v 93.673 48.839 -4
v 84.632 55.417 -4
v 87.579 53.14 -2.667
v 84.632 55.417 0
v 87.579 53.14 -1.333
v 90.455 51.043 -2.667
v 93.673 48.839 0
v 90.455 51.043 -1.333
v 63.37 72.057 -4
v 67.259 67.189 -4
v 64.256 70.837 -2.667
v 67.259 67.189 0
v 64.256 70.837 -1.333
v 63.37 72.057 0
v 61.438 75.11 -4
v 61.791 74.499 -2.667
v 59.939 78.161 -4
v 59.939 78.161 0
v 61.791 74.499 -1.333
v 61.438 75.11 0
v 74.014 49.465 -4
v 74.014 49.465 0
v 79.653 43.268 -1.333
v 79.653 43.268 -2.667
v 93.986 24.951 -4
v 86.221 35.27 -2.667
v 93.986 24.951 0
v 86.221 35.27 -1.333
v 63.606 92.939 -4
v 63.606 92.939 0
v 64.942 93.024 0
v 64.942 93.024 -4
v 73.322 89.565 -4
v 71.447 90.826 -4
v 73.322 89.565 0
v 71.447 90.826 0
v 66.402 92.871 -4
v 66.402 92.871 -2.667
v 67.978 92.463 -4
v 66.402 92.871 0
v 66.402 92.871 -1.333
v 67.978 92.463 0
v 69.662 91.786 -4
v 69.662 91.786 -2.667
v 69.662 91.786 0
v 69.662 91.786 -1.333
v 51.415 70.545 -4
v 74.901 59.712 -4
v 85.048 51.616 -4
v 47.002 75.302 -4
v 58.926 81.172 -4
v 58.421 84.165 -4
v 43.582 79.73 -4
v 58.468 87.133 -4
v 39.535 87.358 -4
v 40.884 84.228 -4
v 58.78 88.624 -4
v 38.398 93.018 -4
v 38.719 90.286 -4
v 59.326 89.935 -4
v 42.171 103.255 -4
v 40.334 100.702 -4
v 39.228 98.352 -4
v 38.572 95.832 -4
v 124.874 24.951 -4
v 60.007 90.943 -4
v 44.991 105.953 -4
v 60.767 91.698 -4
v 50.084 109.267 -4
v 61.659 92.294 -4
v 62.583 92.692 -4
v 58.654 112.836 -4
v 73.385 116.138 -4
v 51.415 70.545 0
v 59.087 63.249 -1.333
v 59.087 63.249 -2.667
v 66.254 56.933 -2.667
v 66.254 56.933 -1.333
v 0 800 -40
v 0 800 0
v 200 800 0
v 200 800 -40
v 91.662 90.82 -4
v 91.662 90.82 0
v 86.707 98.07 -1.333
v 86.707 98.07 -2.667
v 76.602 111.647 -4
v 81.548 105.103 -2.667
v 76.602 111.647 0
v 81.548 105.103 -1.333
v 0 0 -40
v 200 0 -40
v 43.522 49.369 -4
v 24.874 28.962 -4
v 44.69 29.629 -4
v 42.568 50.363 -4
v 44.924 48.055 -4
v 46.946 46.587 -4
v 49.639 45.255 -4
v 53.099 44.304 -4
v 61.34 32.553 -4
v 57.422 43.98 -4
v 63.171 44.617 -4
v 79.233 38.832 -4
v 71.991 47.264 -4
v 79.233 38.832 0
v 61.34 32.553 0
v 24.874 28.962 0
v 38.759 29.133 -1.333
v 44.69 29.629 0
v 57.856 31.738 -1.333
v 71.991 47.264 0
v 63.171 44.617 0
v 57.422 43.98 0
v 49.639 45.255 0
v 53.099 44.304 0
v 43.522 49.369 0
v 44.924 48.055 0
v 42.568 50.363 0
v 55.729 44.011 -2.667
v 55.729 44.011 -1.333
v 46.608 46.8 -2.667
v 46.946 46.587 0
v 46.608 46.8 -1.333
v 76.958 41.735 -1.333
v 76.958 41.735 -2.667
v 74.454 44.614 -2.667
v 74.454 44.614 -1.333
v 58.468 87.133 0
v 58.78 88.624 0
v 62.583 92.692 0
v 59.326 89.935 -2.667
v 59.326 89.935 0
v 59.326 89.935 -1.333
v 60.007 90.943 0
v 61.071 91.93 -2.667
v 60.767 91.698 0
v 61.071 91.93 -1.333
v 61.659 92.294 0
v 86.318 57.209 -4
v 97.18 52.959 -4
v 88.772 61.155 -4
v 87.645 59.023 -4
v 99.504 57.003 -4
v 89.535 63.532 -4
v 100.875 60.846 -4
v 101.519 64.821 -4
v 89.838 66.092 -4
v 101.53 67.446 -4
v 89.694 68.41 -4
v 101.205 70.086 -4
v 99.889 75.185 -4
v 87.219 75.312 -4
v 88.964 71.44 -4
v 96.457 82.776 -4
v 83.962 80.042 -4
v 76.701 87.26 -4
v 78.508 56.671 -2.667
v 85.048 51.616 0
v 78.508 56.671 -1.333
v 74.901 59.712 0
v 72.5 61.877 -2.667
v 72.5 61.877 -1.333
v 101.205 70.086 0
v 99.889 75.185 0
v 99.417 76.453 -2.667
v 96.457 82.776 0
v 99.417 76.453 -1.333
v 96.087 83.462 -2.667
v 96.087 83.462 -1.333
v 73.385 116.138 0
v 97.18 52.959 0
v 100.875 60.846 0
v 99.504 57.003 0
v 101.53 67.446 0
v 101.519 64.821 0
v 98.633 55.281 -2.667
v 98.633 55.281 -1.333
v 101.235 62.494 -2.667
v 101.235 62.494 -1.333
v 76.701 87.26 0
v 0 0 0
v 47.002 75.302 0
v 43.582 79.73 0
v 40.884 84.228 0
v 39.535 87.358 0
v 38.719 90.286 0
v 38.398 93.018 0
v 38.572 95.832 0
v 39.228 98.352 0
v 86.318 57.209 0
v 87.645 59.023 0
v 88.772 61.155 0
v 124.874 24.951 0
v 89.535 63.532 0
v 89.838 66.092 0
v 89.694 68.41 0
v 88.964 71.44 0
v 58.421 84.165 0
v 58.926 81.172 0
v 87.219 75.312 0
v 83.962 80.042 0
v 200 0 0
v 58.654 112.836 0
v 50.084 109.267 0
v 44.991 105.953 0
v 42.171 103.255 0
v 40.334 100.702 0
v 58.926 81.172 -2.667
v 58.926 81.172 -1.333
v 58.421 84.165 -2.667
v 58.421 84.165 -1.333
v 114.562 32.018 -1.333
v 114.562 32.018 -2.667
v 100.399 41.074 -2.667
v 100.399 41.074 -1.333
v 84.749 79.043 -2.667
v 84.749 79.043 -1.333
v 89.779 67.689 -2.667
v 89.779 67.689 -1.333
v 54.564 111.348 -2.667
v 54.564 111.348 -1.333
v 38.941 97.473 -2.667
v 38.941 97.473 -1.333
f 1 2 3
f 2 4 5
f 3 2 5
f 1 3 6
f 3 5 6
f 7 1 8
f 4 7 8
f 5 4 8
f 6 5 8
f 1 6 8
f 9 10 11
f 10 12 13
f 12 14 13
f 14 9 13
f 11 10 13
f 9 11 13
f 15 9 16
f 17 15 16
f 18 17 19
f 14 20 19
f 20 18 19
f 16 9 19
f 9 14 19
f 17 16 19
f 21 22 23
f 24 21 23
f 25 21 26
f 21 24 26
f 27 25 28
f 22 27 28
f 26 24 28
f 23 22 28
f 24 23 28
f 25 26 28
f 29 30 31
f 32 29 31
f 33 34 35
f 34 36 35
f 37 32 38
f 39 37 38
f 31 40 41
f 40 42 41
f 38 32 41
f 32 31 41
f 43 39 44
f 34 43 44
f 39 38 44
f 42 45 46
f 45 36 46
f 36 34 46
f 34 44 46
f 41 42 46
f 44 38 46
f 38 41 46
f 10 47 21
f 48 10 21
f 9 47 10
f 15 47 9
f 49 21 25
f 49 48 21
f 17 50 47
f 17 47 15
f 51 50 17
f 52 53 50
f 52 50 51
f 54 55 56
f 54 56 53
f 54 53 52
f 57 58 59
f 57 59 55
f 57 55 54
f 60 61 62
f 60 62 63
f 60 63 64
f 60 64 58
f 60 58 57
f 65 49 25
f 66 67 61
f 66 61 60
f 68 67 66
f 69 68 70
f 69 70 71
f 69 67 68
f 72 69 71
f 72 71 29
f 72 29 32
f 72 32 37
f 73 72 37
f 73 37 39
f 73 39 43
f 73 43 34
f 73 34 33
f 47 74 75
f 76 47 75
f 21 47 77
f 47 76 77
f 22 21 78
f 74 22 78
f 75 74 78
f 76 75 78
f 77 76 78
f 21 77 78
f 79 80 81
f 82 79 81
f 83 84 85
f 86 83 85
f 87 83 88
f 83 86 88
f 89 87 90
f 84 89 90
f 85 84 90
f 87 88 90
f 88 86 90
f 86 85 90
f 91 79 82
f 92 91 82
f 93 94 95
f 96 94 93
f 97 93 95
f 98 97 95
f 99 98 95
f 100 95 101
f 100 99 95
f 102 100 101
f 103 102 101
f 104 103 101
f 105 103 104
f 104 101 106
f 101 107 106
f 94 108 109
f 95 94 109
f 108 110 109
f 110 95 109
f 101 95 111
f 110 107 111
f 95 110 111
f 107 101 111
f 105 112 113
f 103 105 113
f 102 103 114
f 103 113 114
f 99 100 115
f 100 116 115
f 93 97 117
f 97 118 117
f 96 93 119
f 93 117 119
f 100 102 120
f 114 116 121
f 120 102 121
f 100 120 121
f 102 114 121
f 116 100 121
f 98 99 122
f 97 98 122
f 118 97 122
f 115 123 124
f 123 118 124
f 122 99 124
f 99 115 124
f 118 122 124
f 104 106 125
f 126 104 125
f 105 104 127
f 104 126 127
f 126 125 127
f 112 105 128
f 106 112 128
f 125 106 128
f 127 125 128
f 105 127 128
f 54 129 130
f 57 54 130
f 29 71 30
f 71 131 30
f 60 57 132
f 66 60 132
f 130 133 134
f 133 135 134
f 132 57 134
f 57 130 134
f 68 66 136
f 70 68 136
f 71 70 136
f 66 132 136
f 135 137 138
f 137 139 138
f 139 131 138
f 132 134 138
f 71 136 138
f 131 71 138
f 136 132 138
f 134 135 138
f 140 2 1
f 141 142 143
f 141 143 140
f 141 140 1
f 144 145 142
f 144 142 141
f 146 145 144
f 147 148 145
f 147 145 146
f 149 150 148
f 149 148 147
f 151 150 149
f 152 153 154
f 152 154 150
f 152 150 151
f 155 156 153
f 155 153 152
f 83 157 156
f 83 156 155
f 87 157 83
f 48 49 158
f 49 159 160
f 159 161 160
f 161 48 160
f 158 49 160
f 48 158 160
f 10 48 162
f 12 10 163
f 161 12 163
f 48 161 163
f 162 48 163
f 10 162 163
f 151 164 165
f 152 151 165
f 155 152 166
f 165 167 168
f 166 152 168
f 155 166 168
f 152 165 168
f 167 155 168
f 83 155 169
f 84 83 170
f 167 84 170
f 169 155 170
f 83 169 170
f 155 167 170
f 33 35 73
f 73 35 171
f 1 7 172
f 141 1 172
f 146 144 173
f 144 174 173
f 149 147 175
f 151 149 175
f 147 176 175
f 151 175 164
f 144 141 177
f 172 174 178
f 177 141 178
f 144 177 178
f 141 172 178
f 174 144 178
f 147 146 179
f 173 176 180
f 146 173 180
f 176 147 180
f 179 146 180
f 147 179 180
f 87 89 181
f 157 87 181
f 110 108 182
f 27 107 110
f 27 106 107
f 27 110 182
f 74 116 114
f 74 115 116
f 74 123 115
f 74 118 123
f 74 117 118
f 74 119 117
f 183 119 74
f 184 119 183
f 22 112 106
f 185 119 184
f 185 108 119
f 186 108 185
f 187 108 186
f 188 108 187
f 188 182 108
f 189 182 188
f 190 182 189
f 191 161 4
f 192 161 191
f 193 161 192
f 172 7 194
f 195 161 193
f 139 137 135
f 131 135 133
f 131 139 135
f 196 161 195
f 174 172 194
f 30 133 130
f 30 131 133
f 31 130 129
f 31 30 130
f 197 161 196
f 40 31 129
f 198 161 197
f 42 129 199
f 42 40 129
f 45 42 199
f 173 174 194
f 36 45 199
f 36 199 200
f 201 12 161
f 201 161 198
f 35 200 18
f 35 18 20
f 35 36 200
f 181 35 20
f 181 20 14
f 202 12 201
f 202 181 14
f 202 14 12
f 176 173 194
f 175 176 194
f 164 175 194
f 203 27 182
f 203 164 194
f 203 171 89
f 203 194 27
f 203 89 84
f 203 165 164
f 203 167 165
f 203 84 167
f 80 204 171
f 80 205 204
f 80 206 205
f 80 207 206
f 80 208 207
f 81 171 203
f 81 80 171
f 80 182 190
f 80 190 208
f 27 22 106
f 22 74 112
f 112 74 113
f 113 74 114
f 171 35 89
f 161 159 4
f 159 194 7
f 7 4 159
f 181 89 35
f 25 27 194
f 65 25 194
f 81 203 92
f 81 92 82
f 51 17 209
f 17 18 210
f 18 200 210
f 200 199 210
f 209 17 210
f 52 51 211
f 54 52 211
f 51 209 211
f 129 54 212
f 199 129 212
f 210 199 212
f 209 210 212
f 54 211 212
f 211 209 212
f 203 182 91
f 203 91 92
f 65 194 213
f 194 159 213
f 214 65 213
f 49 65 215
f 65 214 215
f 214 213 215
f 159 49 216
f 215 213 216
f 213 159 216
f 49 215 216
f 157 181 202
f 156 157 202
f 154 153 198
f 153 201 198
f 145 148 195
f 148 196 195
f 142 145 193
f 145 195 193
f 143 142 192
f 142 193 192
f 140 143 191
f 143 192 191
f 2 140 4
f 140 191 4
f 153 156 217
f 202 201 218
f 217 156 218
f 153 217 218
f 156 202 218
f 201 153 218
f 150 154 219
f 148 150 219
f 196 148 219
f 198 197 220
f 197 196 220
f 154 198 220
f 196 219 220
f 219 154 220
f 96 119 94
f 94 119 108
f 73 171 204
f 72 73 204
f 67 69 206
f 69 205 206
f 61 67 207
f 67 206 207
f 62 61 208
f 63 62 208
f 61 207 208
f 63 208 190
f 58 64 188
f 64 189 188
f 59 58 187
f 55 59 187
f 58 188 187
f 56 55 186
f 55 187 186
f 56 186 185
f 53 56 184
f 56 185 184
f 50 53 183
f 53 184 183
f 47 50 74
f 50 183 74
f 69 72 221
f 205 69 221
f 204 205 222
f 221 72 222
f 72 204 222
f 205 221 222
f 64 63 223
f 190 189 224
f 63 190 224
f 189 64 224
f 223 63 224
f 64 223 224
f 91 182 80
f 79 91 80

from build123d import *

# Parameters (mm, degrees)
F0_W     = 200
F0_H     = 800
F1_DEPTH = 40
F3_DEPTH = 4


# Not quite as in the source:
# - ends of sketch curves that miss each other by under 0.0002 mm in the source are joined
# - a feature of the source that left no trace in its solid (it failed there, or was rolled back) is left out


with BuildPart() as f1:
    # F0 (on Top) → F1 (new body)
    with BuildSketch(Plane.XY):
        with Locations((100, 400)):
            Rectangle(F0_W, F0_H)
    extrude(amount=-F1_DEPTH)

    # F2 (on face) → F3 (cut)
    with BuildSketch(Plane.XY):
        with BuildLine():
            add(Edge.make_bspline(
                [(74.0144076195, 49.4648806587), (79.2780666431, 43.995087588), (85.5330334882, 36.6035044423), (93.9858326346, 24.9514187131)],
                knots=[0, 0, 0, 0, 1, 1, 1, 1], degree=3))
            Line((93.9858326346, 24.9514187131), (124.8743034899, 24.9514187131))
            add(Edge.make_bspline(
                [(124.8743034899, 24.9514187131), (117.373795502, 30.8557542171), (100.1070204646, 40.4994924549), (85.0477587545, 51.6157174292)],
                knots=[0, 0, 0, 0, 1, 1, 1, 1], degree=3))
            add(Edge.make_bspline(
                [(85.0477587545, 51.6157174292), (78.3221982923, 56.5802620007), (72.0369383461, 61.8389475301), (67.2585806524, 67.1891107778)],
                knots=[0, 0, 0, 0, 1, 1, 1, 1], degree=3))
            add(Edge.make_bspline(
                [(67.2585806524, 67.1891107778), (64.0111017086, 70.825439839), (61.4596060965, 74.5036446576), (59.9390200859, 78.1614235749)],
                knots=[0, 0, 0, 0, 1, 1, 1, 1], degree=3))
            add(Edge.make_bspline(
                [(59.9390200859, 78.1614235749), (58.6848351698, 81.1781536647), (58.1318996379, 84.1804553021), (58.4680892286, 87.1331416805)],
                knots=[0, 0, 0, 0, 1, 1, 1, 1], degree=3))
            add(Edge.make_bspline(
                [(58.4680892286, 87.1331416805), (58.8494259124, 90.279355495), (60.7095393399, 92.4826134262), (63.6064002406, 92.9386057154)],
                knots=[0, 0, 0, 0, 1, 1, 1, 1], degree=3))
            add(Edge.make_bspline(
                [(63.6064002406, 92.9386057154), (66.1469914002, 93.338307093), (69.4850038962, 92.3950054588), (73.3222940387, 89.5654596054)],
                knots=[0, 0, 0, 0, 1, 1, 1, 1], degree=3))
            Line((73.3222940387, 89.5654596054), (73.3850611313, 116.1375625051))
            add(Edge.make_bspline(
                [(73.3850611313, 116.1375625051), (61.2635786151, 114.5669223978), (16.5941537425, 105.3232312885), (51.4149430547, 70.5446634846)],
                knots=[0, 0, 0, 0, 1, 1, 1, 1], degree=3))
            add(Edge.make_bspline(
                [(51.4149430547, 70.5446634846), (59.7059440621, 62.0496960224), (65.5907579364, 58.2180974722), (74.0144076195, 49.4648806587)],
                knots=[0, 0, 0, 0, 1, 1, 1, 1], degree=3))
        make_face()
        with BuildLine():
            add(Edge.make_bspline(
                [(91.6621868878, 90.8201365516), (86.9476734338, 98.0875153234), (81.3030633718, 105.4382865607), (76.6022868683, 111.646603626)],
                knots=[0, 0, 0, 0, 1, 1, 1, 1], degree=3))
            Line((76.6022868683, 111.646603626), (76.7011849335, 87.2598062052))
            add(Edge.make_bspline(
                [(76.7011849335, 87.2598062052), (83.8706497004, 81.3502046486), (97.2544954721, 67.4086626207), (84.6318469774, 55.4167037236)],
                knots=[0, 0, 0, 0, 1, 1, 1, 1], degree=3))
            add(Edge.make_bspline(
                [(84.6318469774, 55.4167037236), (87.753206619, 52.954491641), (90.1454573299, 51.1927975466), (93.6734466659, 48.8385927365)],
                knots=[0, 0, 0, 0, 1, 1, 1, 1], degree=3))
            add(Edge.make_bspline(
                [(93.6734466659, 48.8385927365), (99.7215214715, 54.7664924964), (102.6407232018, 62.4339183966), (101.2052451133, 70.0858652935)],
                knots=[0, 0, 0, 0, 1, 1, 1, 1], degree=3))
            add(Edge.make_bspline(
                [(101.2052451133, 70.0858652935), (100.3360804582, 76.0348691585), (96.4859975312, 83.3838717469), (91.6621868878, 90.8201365516)],
                knots=[0, 0, 0, 0, 1, 1, 1, 1], degree=3))
        make_face()
        with BuildLine():
            add(Edge.make_bspline(
                [(71.9907407021, 47.2640828783), (51.4723643059, 39.233897758), (44.7548226057, 48.169378506), (42.5680809306, 50.3631415847)],
                knots=[0, 0, 0, 0, 1, 1, 1, 1], degree=3))
            Line((42.5680809306, 50.3631415847), (24.8743034899, 28.961757198))
            add(Edge.make_bspline(
                [(24.8743034899, 28.961757198), (35.1755403208, 28.6025219778), (57.6930087218, 28.8069538664), (79.2330525311, 38.8320952786)],
                knots=[0, 0, 0, 0, 1, 1, 1, 1], degree=3))
            add(Edge.make_bspline(
                [(79.2330525311, 38.8320952786), (77.1638794716, 41.6785297354), (74.3423390821, 44.7962323959), (71.9907407021, 47.2640828783)],
                knots=[0, 0, 0, 0, 1, 1, 1, 1], degree=3))
        make_face()
    extrude(amount=-F3_DEPTH, mode=Mode.SUBTRACT)


solid = f1.part
